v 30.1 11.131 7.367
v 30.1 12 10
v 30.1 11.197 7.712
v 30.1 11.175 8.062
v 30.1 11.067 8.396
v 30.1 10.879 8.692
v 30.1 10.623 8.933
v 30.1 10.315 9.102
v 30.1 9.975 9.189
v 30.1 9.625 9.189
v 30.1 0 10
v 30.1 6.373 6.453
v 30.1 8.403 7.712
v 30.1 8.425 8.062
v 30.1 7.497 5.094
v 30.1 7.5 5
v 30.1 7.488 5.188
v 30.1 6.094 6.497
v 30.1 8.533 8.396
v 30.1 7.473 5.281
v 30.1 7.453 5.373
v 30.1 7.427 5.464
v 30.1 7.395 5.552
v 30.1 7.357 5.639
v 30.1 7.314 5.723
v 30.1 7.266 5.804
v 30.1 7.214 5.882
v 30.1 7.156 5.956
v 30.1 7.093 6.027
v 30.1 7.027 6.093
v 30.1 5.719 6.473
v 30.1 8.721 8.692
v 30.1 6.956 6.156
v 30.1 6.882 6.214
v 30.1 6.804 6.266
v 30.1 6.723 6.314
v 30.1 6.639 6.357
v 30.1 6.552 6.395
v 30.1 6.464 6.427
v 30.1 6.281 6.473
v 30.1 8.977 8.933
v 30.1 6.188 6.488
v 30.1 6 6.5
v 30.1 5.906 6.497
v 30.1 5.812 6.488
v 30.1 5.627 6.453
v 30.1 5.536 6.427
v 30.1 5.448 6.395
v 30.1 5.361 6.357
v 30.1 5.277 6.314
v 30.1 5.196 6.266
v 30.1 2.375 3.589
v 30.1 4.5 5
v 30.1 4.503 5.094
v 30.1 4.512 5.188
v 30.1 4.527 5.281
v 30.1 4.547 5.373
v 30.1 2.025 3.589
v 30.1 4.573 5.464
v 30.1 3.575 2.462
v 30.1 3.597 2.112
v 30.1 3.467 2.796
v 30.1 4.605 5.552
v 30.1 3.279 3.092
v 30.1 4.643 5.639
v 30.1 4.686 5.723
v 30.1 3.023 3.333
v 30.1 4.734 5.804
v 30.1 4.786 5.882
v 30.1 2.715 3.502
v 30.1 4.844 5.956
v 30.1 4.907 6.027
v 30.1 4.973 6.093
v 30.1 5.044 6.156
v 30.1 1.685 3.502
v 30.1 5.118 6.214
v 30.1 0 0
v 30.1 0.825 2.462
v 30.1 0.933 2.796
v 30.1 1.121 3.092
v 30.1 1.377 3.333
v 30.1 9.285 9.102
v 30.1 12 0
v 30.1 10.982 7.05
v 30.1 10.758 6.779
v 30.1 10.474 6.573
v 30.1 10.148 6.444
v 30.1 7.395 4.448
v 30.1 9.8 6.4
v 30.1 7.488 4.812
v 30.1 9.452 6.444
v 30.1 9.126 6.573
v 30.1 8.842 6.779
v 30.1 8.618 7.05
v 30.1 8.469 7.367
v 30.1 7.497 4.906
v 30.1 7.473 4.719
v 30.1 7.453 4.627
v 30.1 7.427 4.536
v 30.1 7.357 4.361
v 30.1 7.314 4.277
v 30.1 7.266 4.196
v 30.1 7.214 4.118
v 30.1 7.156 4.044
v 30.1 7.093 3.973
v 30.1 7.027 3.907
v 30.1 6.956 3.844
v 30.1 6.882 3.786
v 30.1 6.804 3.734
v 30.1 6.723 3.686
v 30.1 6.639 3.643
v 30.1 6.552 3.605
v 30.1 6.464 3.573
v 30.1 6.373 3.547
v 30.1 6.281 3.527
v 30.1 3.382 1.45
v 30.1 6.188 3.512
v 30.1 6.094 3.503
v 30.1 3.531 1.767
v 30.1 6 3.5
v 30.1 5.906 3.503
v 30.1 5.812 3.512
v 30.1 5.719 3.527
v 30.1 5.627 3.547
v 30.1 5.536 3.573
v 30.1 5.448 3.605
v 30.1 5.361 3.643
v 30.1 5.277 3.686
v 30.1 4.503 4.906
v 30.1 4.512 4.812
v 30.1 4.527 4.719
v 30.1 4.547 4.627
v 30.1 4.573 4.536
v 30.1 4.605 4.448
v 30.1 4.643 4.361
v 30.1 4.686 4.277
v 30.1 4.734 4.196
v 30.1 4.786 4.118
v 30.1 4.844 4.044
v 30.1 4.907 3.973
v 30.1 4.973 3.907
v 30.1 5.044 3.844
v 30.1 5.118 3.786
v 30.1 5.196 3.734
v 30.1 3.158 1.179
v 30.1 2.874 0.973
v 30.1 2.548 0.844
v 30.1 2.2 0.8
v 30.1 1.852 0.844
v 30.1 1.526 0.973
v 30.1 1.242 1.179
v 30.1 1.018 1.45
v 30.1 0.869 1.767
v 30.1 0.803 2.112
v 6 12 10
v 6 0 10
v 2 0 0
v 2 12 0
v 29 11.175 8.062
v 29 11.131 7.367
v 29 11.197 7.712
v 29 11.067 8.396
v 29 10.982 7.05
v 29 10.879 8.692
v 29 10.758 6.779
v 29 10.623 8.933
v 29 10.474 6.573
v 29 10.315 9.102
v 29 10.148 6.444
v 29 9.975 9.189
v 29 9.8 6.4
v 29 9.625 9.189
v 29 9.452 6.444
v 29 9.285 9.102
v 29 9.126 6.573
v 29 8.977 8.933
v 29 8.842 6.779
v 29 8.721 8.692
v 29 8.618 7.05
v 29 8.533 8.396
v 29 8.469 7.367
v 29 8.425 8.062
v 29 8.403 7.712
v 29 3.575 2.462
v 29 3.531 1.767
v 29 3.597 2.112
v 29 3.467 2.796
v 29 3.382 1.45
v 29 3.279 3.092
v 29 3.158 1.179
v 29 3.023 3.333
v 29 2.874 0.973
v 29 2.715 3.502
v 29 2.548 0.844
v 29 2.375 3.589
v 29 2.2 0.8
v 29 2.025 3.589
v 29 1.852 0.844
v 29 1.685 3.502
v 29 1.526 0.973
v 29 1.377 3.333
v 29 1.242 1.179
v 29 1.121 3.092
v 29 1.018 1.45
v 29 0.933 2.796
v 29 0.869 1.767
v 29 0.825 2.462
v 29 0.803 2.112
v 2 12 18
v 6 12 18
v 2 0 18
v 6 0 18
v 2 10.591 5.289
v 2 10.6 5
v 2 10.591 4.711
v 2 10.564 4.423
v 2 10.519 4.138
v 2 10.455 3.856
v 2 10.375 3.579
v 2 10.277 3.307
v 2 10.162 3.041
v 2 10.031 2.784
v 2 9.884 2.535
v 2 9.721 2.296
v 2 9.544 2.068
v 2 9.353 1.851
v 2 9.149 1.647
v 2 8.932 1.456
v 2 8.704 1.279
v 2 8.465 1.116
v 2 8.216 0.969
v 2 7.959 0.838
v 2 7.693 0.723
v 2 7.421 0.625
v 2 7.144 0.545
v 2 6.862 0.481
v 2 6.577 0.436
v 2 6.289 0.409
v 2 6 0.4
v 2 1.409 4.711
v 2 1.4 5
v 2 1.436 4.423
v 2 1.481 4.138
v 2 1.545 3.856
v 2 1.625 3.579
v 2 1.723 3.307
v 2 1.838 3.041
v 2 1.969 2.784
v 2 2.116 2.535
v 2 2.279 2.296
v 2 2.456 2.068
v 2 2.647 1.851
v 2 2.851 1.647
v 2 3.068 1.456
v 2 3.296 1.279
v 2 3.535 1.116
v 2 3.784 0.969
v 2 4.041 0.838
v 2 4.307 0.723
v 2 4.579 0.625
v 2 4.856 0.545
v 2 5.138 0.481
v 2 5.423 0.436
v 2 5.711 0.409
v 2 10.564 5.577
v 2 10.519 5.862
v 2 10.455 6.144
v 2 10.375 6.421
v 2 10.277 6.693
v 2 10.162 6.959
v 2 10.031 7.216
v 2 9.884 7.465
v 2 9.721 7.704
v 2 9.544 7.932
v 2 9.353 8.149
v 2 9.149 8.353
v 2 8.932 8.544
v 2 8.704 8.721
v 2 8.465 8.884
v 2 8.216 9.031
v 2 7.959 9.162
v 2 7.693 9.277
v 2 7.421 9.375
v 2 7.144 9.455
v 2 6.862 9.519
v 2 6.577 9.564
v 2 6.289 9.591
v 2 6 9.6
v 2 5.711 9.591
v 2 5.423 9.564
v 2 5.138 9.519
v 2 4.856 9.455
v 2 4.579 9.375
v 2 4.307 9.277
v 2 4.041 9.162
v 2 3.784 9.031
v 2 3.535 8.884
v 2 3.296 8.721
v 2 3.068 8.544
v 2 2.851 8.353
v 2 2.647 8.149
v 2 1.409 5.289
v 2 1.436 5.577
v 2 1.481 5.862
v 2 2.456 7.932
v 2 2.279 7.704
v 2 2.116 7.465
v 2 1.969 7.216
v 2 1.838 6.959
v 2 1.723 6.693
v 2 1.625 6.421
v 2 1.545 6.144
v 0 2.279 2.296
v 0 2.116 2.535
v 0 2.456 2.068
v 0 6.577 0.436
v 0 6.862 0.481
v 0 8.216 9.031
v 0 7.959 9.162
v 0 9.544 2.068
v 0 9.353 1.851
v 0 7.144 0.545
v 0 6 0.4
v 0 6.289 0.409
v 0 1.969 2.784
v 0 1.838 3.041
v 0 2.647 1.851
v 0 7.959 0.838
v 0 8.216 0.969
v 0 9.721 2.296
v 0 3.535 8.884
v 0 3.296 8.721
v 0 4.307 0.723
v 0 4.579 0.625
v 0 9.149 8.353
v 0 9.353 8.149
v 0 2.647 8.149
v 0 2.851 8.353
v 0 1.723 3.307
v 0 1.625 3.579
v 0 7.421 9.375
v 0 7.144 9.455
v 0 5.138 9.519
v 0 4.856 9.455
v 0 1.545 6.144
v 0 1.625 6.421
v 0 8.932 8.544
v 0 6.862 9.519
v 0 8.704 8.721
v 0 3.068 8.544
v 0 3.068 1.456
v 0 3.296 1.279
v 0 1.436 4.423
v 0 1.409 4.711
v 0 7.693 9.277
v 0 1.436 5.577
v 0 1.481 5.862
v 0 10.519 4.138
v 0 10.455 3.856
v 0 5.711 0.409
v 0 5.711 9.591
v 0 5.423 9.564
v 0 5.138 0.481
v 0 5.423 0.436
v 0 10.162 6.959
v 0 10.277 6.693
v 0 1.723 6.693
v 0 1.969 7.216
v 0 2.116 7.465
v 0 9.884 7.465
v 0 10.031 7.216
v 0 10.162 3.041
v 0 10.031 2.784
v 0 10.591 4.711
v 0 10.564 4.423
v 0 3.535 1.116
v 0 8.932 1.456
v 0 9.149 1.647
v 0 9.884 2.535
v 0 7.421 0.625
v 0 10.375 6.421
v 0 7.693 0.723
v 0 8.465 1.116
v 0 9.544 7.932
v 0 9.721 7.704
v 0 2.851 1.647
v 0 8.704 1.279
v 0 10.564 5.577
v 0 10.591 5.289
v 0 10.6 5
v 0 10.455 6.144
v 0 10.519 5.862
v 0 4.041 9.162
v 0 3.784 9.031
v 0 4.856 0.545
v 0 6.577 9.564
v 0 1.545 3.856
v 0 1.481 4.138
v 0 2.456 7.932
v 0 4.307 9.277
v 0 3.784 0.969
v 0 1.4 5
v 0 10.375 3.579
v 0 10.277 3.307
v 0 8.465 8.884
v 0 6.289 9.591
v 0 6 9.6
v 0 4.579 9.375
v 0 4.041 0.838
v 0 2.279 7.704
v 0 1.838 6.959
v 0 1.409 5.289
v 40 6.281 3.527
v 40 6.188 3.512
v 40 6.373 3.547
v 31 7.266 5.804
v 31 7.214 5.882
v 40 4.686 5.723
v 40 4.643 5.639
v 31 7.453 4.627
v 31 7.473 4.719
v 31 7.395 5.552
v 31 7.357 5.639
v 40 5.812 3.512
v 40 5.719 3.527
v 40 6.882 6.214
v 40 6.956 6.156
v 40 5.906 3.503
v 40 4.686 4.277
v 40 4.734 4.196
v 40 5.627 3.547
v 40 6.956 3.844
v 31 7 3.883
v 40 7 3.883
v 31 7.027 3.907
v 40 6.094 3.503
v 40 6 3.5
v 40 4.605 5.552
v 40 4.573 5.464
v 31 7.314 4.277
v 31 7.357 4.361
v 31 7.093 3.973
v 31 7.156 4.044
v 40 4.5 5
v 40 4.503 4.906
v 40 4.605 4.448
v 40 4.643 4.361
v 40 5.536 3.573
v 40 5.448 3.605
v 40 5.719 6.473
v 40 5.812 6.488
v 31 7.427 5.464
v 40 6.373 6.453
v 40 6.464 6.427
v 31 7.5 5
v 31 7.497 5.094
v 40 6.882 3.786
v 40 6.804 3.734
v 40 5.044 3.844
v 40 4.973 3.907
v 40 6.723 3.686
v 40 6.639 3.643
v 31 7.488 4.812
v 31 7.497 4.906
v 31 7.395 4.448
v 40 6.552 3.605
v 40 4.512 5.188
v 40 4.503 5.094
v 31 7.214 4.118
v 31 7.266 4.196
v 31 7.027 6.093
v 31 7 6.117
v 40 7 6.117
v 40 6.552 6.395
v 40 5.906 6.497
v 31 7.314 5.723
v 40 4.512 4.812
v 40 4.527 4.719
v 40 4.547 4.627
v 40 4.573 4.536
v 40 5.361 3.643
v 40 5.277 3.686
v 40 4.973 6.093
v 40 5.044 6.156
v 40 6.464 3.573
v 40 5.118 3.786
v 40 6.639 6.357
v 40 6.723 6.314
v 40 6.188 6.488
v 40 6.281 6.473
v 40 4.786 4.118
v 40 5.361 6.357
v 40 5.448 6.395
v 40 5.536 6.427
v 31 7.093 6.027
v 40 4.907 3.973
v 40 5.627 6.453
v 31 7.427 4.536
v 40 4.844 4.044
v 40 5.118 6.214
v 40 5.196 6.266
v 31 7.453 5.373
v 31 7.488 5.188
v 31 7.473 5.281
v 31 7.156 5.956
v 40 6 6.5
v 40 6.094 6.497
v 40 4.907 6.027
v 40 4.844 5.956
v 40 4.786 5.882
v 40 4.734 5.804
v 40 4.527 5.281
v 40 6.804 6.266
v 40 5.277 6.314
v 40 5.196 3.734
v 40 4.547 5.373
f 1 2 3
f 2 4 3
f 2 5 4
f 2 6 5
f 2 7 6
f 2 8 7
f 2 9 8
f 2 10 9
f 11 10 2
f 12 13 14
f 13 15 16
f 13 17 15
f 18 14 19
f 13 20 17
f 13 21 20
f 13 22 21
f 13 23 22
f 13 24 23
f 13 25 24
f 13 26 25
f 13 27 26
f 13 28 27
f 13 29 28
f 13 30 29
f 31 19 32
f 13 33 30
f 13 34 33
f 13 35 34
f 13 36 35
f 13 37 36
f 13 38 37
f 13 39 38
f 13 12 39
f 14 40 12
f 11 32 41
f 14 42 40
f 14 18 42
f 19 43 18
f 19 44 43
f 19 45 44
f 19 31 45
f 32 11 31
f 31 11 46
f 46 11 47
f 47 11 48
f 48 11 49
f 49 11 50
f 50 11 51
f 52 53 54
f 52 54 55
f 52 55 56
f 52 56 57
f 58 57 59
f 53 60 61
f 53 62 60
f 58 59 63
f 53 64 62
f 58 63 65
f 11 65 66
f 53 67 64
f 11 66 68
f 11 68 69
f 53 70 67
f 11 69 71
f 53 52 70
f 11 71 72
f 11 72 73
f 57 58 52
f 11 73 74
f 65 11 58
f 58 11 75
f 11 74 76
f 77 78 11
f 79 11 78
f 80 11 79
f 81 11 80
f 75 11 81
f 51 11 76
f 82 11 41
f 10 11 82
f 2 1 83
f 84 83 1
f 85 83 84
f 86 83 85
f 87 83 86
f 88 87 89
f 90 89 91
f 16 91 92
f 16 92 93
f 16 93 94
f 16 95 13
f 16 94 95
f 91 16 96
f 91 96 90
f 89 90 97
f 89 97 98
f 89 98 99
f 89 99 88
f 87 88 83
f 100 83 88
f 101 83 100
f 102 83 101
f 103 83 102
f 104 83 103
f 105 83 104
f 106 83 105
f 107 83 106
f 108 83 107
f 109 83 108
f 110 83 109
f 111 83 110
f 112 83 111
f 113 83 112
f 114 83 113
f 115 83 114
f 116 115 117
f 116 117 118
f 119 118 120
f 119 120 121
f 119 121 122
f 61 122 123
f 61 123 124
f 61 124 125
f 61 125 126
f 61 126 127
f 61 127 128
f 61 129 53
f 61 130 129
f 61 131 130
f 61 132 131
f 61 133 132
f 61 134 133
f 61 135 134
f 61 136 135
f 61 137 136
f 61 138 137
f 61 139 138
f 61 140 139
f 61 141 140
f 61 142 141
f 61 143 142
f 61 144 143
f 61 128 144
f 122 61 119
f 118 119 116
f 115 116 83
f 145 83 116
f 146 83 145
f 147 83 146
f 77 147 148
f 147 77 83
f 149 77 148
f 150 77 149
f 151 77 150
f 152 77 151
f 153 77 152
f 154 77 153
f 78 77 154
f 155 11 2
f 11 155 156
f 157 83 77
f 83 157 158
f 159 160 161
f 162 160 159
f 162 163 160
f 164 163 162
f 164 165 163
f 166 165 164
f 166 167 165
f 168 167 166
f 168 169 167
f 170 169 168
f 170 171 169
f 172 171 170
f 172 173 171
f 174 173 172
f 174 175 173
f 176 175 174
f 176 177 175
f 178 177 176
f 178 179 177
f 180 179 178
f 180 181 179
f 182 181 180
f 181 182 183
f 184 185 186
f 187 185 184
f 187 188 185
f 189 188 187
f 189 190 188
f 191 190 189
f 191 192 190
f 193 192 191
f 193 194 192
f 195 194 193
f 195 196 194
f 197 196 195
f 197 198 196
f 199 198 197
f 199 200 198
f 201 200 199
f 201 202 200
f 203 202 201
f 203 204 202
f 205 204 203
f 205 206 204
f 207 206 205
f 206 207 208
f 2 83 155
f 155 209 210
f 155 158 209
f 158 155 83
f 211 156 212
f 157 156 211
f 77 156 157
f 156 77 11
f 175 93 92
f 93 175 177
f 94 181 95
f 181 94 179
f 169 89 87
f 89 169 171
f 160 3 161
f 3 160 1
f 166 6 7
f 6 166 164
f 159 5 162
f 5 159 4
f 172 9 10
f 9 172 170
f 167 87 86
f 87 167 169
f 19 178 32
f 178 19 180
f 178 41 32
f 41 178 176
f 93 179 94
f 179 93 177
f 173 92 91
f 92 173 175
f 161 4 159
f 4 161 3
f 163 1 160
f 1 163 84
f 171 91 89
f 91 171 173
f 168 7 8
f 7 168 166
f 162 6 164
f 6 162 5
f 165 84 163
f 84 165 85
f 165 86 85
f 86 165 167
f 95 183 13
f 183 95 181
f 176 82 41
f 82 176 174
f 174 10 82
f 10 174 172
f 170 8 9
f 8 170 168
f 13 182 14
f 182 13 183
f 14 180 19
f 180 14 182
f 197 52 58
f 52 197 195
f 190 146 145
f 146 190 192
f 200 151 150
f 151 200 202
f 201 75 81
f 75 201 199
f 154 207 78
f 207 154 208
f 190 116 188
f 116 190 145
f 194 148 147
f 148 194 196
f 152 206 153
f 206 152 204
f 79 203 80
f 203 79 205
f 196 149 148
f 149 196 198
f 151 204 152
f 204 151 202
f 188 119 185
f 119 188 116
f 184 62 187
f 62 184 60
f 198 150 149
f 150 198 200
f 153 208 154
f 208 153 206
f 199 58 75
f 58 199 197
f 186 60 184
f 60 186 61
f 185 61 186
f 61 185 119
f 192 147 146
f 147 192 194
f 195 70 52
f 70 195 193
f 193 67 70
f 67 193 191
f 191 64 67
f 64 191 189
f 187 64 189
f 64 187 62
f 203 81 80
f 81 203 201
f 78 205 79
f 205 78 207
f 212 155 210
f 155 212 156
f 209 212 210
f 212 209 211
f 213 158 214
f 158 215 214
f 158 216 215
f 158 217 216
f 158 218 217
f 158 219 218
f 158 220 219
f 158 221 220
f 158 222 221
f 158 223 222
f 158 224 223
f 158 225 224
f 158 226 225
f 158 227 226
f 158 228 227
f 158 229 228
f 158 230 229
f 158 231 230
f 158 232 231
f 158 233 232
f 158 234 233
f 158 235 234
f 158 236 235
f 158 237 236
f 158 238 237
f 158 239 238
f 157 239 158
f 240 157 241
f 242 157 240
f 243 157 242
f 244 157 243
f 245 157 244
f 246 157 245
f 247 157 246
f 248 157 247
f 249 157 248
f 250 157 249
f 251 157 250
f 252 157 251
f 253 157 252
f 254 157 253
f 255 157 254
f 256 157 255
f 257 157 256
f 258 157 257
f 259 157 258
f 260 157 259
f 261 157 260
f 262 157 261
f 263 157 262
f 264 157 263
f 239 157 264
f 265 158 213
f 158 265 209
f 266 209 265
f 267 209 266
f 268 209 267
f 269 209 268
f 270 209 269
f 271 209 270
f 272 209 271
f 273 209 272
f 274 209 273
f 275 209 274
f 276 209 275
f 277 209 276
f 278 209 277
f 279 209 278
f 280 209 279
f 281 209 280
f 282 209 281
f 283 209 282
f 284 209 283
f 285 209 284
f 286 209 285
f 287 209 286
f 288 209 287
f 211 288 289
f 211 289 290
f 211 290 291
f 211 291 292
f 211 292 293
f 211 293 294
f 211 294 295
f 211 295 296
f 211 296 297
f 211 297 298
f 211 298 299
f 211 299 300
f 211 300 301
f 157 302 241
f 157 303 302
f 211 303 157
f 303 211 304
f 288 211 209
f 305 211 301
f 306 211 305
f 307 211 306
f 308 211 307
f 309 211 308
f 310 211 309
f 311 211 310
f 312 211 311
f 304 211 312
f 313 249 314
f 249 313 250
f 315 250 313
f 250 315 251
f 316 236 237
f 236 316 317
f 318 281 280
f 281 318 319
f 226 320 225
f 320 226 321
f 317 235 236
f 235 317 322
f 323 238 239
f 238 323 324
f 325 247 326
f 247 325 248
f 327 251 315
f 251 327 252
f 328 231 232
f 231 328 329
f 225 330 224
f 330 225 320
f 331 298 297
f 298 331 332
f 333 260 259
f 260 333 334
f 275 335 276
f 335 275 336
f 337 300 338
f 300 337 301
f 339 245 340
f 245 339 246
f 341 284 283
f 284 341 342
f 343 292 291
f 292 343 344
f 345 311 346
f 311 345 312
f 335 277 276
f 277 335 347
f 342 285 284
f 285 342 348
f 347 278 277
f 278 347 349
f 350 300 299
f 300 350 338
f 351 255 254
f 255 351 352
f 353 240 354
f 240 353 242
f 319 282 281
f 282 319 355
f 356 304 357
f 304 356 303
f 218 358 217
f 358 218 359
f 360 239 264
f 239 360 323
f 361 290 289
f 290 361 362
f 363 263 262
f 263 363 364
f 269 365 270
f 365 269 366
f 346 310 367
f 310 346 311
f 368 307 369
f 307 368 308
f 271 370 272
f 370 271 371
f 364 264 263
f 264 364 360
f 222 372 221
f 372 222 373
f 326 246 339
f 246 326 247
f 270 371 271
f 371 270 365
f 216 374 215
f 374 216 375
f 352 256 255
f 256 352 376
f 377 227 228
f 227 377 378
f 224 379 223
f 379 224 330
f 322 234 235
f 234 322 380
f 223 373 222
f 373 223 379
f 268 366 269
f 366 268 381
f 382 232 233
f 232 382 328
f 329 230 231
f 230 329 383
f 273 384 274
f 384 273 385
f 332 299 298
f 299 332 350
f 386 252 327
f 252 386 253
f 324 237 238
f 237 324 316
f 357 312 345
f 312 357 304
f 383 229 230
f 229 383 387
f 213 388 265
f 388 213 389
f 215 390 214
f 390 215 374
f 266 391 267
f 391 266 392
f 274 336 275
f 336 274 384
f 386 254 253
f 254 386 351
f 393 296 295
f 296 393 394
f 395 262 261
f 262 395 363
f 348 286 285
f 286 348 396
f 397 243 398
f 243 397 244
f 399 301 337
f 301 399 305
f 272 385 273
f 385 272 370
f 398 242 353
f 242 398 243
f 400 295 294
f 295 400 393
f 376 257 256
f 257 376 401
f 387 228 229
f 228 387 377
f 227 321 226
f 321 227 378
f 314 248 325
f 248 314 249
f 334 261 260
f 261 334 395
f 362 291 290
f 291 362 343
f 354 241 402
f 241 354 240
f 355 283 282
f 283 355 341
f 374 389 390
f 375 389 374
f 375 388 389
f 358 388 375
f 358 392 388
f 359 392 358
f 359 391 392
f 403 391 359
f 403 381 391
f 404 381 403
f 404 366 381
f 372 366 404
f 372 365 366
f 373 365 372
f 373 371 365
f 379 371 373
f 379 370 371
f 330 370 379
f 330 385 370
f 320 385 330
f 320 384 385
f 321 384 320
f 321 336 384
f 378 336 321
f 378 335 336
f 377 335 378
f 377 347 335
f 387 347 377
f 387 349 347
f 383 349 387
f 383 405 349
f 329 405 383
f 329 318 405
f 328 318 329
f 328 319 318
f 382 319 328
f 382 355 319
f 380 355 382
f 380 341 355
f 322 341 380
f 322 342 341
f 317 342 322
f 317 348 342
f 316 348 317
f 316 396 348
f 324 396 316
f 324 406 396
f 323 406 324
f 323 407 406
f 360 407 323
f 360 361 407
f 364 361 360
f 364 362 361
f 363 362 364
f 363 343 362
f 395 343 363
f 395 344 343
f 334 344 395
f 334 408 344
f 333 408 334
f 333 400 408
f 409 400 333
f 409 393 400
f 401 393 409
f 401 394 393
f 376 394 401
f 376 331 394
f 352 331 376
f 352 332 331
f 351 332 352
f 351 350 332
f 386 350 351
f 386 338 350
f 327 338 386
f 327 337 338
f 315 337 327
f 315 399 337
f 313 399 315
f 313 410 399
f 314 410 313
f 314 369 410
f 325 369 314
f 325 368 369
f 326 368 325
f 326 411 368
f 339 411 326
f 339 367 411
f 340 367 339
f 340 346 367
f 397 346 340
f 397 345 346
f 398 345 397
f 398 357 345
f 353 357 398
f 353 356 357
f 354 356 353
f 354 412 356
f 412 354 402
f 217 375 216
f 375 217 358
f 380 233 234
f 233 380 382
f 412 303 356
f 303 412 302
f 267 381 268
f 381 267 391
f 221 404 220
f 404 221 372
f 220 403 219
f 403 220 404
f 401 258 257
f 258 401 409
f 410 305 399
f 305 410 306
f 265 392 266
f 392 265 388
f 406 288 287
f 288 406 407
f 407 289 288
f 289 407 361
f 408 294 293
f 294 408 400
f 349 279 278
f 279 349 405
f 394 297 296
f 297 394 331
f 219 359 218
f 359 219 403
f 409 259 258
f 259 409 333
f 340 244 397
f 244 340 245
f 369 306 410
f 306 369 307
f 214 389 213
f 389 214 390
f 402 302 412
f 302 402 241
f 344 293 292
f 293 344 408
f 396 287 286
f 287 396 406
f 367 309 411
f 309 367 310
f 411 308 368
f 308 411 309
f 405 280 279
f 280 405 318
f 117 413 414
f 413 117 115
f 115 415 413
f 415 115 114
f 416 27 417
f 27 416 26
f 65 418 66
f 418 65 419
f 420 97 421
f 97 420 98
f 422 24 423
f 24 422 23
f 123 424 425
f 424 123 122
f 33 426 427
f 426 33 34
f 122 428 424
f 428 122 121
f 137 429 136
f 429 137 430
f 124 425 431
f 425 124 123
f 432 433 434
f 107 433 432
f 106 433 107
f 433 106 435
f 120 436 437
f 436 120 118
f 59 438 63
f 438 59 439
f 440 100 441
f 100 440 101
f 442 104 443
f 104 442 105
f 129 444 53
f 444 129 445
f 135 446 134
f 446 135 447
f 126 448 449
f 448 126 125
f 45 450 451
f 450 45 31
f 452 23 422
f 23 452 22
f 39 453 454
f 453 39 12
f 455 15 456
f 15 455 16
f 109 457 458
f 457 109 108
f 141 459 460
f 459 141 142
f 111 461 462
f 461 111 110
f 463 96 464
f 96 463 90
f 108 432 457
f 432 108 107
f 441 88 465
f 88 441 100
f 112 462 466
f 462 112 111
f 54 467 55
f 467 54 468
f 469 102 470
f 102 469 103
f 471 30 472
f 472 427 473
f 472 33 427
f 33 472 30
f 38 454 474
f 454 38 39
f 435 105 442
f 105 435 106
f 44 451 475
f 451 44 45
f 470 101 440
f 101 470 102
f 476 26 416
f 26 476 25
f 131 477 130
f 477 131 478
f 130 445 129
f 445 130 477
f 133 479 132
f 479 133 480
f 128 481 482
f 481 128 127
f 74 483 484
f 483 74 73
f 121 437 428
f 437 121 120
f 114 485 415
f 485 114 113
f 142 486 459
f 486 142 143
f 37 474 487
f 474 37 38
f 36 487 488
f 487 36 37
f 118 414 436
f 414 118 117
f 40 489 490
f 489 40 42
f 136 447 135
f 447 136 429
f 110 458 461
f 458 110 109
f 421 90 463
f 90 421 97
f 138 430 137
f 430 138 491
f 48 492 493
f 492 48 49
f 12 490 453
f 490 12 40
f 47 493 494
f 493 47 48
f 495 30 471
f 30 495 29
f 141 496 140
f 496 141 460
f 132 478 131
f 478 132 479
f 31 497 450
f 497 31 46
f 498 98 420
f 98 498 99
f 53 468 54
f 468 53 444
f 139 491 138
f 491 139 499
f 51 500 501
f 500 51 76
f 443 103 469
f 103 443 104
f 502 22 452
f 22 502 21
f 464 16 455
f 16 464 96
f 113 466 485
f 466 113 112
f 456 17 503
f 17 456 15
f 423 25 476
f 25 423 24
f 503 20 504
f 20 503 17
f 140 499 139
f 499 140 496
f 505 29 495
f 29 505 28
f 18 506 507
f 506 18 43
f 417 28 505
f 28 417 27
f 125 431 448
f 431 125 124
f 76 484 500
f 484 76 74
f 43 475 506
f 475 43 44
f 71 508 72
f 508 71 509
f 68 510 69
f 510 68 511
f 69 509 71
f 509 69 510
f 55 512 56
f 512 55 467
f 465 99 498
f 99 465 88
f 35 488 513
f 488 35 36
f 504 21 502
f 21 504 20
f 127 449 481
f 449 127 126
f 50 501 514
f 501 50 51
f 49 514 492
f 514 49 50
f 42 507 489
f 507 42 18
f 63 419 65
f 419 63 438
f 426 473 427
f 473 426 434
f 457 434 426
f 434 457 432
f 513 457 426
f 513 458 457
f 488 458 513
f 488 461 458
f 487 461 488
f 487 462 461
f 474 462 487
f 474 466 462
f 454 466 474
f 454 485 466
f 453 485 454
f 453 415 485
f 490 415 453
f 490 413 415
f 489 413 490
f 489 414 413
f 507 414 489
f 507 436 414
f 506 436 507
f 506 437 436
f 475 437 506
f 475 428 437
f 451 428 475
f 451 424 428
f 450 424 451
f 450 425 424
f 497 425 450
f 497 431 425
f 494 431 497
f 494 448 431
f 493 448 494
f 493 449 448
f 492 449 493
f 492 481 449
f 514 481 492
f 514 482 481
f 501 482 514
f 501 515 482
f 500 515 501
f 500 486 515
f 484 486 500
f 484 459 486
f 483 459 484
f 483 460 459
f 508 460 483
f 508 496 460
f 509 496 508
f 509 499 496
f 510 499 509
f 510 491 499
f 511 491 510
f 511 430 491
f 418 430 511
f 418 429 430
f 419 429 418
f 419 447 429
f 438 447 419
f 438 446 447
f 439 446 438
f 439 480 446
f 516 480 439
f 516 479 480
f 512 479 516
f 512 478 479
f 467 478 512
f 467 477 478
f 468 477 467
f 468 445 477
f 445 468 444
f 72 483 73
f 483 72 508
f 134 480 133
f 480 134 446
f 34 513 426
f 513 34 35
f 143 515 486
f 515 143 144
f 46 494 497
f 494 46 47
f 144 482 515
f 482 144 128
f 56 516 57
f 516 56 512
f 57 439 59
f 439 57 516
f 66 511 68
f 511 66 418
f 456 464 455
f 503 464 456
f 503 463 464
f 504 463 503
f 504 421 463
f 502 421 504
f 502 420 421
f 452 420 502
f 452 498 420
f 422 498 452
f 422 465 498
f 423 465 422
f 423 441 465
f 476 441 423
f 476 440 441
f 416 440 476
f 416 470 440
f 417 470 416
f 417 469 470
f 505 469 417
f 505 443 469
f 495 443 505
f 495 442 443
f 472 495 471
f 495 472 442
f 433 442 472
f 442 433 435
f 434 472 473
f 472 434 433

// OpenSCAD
module motor(){
    // Housing
    color("LightCyan"){
        translate([6,0,0]){
            cube([23,12,10]);
        }
    }
    color("Cyan"){
        difference() {
            translate([29,0,0]){
                cube([1.1,12,10]);
            }
            translate([28.8,9.8,7.8]){
                rotate([0,90,0]){
                    $fn=25;
                    cylinder(1.4,1.4,1.4);
                }
            }
            translate([28.8,2.2,2.2]){
                rotate([0,90,0]){
                    $fn=25;
                    cylinder(1.4,1.4,1.4);
                }
            }
          }
    }
        
    // PCB+Hall sensor
    color("Green"){
        translate([2,0,0]){
            cube([4,12,18]);
        }
        rotate([0,90,0]){
            translate([-5,6,0]){
                $fn=100;
                cylinder(2,4.6,4.6);
            }
        }
    }
    
    // Shaft
    color("Silver"){
        difference() {
            translate([30,6,5]){
                rotate([0,90,0]){
                    $fn=100;
                    cylinder(10,1.5,1.5);
                }
            }
            translate([31,7,3.5]){
                cube([9.1,2,3]); 
            }
        }
    }
}

motor();
